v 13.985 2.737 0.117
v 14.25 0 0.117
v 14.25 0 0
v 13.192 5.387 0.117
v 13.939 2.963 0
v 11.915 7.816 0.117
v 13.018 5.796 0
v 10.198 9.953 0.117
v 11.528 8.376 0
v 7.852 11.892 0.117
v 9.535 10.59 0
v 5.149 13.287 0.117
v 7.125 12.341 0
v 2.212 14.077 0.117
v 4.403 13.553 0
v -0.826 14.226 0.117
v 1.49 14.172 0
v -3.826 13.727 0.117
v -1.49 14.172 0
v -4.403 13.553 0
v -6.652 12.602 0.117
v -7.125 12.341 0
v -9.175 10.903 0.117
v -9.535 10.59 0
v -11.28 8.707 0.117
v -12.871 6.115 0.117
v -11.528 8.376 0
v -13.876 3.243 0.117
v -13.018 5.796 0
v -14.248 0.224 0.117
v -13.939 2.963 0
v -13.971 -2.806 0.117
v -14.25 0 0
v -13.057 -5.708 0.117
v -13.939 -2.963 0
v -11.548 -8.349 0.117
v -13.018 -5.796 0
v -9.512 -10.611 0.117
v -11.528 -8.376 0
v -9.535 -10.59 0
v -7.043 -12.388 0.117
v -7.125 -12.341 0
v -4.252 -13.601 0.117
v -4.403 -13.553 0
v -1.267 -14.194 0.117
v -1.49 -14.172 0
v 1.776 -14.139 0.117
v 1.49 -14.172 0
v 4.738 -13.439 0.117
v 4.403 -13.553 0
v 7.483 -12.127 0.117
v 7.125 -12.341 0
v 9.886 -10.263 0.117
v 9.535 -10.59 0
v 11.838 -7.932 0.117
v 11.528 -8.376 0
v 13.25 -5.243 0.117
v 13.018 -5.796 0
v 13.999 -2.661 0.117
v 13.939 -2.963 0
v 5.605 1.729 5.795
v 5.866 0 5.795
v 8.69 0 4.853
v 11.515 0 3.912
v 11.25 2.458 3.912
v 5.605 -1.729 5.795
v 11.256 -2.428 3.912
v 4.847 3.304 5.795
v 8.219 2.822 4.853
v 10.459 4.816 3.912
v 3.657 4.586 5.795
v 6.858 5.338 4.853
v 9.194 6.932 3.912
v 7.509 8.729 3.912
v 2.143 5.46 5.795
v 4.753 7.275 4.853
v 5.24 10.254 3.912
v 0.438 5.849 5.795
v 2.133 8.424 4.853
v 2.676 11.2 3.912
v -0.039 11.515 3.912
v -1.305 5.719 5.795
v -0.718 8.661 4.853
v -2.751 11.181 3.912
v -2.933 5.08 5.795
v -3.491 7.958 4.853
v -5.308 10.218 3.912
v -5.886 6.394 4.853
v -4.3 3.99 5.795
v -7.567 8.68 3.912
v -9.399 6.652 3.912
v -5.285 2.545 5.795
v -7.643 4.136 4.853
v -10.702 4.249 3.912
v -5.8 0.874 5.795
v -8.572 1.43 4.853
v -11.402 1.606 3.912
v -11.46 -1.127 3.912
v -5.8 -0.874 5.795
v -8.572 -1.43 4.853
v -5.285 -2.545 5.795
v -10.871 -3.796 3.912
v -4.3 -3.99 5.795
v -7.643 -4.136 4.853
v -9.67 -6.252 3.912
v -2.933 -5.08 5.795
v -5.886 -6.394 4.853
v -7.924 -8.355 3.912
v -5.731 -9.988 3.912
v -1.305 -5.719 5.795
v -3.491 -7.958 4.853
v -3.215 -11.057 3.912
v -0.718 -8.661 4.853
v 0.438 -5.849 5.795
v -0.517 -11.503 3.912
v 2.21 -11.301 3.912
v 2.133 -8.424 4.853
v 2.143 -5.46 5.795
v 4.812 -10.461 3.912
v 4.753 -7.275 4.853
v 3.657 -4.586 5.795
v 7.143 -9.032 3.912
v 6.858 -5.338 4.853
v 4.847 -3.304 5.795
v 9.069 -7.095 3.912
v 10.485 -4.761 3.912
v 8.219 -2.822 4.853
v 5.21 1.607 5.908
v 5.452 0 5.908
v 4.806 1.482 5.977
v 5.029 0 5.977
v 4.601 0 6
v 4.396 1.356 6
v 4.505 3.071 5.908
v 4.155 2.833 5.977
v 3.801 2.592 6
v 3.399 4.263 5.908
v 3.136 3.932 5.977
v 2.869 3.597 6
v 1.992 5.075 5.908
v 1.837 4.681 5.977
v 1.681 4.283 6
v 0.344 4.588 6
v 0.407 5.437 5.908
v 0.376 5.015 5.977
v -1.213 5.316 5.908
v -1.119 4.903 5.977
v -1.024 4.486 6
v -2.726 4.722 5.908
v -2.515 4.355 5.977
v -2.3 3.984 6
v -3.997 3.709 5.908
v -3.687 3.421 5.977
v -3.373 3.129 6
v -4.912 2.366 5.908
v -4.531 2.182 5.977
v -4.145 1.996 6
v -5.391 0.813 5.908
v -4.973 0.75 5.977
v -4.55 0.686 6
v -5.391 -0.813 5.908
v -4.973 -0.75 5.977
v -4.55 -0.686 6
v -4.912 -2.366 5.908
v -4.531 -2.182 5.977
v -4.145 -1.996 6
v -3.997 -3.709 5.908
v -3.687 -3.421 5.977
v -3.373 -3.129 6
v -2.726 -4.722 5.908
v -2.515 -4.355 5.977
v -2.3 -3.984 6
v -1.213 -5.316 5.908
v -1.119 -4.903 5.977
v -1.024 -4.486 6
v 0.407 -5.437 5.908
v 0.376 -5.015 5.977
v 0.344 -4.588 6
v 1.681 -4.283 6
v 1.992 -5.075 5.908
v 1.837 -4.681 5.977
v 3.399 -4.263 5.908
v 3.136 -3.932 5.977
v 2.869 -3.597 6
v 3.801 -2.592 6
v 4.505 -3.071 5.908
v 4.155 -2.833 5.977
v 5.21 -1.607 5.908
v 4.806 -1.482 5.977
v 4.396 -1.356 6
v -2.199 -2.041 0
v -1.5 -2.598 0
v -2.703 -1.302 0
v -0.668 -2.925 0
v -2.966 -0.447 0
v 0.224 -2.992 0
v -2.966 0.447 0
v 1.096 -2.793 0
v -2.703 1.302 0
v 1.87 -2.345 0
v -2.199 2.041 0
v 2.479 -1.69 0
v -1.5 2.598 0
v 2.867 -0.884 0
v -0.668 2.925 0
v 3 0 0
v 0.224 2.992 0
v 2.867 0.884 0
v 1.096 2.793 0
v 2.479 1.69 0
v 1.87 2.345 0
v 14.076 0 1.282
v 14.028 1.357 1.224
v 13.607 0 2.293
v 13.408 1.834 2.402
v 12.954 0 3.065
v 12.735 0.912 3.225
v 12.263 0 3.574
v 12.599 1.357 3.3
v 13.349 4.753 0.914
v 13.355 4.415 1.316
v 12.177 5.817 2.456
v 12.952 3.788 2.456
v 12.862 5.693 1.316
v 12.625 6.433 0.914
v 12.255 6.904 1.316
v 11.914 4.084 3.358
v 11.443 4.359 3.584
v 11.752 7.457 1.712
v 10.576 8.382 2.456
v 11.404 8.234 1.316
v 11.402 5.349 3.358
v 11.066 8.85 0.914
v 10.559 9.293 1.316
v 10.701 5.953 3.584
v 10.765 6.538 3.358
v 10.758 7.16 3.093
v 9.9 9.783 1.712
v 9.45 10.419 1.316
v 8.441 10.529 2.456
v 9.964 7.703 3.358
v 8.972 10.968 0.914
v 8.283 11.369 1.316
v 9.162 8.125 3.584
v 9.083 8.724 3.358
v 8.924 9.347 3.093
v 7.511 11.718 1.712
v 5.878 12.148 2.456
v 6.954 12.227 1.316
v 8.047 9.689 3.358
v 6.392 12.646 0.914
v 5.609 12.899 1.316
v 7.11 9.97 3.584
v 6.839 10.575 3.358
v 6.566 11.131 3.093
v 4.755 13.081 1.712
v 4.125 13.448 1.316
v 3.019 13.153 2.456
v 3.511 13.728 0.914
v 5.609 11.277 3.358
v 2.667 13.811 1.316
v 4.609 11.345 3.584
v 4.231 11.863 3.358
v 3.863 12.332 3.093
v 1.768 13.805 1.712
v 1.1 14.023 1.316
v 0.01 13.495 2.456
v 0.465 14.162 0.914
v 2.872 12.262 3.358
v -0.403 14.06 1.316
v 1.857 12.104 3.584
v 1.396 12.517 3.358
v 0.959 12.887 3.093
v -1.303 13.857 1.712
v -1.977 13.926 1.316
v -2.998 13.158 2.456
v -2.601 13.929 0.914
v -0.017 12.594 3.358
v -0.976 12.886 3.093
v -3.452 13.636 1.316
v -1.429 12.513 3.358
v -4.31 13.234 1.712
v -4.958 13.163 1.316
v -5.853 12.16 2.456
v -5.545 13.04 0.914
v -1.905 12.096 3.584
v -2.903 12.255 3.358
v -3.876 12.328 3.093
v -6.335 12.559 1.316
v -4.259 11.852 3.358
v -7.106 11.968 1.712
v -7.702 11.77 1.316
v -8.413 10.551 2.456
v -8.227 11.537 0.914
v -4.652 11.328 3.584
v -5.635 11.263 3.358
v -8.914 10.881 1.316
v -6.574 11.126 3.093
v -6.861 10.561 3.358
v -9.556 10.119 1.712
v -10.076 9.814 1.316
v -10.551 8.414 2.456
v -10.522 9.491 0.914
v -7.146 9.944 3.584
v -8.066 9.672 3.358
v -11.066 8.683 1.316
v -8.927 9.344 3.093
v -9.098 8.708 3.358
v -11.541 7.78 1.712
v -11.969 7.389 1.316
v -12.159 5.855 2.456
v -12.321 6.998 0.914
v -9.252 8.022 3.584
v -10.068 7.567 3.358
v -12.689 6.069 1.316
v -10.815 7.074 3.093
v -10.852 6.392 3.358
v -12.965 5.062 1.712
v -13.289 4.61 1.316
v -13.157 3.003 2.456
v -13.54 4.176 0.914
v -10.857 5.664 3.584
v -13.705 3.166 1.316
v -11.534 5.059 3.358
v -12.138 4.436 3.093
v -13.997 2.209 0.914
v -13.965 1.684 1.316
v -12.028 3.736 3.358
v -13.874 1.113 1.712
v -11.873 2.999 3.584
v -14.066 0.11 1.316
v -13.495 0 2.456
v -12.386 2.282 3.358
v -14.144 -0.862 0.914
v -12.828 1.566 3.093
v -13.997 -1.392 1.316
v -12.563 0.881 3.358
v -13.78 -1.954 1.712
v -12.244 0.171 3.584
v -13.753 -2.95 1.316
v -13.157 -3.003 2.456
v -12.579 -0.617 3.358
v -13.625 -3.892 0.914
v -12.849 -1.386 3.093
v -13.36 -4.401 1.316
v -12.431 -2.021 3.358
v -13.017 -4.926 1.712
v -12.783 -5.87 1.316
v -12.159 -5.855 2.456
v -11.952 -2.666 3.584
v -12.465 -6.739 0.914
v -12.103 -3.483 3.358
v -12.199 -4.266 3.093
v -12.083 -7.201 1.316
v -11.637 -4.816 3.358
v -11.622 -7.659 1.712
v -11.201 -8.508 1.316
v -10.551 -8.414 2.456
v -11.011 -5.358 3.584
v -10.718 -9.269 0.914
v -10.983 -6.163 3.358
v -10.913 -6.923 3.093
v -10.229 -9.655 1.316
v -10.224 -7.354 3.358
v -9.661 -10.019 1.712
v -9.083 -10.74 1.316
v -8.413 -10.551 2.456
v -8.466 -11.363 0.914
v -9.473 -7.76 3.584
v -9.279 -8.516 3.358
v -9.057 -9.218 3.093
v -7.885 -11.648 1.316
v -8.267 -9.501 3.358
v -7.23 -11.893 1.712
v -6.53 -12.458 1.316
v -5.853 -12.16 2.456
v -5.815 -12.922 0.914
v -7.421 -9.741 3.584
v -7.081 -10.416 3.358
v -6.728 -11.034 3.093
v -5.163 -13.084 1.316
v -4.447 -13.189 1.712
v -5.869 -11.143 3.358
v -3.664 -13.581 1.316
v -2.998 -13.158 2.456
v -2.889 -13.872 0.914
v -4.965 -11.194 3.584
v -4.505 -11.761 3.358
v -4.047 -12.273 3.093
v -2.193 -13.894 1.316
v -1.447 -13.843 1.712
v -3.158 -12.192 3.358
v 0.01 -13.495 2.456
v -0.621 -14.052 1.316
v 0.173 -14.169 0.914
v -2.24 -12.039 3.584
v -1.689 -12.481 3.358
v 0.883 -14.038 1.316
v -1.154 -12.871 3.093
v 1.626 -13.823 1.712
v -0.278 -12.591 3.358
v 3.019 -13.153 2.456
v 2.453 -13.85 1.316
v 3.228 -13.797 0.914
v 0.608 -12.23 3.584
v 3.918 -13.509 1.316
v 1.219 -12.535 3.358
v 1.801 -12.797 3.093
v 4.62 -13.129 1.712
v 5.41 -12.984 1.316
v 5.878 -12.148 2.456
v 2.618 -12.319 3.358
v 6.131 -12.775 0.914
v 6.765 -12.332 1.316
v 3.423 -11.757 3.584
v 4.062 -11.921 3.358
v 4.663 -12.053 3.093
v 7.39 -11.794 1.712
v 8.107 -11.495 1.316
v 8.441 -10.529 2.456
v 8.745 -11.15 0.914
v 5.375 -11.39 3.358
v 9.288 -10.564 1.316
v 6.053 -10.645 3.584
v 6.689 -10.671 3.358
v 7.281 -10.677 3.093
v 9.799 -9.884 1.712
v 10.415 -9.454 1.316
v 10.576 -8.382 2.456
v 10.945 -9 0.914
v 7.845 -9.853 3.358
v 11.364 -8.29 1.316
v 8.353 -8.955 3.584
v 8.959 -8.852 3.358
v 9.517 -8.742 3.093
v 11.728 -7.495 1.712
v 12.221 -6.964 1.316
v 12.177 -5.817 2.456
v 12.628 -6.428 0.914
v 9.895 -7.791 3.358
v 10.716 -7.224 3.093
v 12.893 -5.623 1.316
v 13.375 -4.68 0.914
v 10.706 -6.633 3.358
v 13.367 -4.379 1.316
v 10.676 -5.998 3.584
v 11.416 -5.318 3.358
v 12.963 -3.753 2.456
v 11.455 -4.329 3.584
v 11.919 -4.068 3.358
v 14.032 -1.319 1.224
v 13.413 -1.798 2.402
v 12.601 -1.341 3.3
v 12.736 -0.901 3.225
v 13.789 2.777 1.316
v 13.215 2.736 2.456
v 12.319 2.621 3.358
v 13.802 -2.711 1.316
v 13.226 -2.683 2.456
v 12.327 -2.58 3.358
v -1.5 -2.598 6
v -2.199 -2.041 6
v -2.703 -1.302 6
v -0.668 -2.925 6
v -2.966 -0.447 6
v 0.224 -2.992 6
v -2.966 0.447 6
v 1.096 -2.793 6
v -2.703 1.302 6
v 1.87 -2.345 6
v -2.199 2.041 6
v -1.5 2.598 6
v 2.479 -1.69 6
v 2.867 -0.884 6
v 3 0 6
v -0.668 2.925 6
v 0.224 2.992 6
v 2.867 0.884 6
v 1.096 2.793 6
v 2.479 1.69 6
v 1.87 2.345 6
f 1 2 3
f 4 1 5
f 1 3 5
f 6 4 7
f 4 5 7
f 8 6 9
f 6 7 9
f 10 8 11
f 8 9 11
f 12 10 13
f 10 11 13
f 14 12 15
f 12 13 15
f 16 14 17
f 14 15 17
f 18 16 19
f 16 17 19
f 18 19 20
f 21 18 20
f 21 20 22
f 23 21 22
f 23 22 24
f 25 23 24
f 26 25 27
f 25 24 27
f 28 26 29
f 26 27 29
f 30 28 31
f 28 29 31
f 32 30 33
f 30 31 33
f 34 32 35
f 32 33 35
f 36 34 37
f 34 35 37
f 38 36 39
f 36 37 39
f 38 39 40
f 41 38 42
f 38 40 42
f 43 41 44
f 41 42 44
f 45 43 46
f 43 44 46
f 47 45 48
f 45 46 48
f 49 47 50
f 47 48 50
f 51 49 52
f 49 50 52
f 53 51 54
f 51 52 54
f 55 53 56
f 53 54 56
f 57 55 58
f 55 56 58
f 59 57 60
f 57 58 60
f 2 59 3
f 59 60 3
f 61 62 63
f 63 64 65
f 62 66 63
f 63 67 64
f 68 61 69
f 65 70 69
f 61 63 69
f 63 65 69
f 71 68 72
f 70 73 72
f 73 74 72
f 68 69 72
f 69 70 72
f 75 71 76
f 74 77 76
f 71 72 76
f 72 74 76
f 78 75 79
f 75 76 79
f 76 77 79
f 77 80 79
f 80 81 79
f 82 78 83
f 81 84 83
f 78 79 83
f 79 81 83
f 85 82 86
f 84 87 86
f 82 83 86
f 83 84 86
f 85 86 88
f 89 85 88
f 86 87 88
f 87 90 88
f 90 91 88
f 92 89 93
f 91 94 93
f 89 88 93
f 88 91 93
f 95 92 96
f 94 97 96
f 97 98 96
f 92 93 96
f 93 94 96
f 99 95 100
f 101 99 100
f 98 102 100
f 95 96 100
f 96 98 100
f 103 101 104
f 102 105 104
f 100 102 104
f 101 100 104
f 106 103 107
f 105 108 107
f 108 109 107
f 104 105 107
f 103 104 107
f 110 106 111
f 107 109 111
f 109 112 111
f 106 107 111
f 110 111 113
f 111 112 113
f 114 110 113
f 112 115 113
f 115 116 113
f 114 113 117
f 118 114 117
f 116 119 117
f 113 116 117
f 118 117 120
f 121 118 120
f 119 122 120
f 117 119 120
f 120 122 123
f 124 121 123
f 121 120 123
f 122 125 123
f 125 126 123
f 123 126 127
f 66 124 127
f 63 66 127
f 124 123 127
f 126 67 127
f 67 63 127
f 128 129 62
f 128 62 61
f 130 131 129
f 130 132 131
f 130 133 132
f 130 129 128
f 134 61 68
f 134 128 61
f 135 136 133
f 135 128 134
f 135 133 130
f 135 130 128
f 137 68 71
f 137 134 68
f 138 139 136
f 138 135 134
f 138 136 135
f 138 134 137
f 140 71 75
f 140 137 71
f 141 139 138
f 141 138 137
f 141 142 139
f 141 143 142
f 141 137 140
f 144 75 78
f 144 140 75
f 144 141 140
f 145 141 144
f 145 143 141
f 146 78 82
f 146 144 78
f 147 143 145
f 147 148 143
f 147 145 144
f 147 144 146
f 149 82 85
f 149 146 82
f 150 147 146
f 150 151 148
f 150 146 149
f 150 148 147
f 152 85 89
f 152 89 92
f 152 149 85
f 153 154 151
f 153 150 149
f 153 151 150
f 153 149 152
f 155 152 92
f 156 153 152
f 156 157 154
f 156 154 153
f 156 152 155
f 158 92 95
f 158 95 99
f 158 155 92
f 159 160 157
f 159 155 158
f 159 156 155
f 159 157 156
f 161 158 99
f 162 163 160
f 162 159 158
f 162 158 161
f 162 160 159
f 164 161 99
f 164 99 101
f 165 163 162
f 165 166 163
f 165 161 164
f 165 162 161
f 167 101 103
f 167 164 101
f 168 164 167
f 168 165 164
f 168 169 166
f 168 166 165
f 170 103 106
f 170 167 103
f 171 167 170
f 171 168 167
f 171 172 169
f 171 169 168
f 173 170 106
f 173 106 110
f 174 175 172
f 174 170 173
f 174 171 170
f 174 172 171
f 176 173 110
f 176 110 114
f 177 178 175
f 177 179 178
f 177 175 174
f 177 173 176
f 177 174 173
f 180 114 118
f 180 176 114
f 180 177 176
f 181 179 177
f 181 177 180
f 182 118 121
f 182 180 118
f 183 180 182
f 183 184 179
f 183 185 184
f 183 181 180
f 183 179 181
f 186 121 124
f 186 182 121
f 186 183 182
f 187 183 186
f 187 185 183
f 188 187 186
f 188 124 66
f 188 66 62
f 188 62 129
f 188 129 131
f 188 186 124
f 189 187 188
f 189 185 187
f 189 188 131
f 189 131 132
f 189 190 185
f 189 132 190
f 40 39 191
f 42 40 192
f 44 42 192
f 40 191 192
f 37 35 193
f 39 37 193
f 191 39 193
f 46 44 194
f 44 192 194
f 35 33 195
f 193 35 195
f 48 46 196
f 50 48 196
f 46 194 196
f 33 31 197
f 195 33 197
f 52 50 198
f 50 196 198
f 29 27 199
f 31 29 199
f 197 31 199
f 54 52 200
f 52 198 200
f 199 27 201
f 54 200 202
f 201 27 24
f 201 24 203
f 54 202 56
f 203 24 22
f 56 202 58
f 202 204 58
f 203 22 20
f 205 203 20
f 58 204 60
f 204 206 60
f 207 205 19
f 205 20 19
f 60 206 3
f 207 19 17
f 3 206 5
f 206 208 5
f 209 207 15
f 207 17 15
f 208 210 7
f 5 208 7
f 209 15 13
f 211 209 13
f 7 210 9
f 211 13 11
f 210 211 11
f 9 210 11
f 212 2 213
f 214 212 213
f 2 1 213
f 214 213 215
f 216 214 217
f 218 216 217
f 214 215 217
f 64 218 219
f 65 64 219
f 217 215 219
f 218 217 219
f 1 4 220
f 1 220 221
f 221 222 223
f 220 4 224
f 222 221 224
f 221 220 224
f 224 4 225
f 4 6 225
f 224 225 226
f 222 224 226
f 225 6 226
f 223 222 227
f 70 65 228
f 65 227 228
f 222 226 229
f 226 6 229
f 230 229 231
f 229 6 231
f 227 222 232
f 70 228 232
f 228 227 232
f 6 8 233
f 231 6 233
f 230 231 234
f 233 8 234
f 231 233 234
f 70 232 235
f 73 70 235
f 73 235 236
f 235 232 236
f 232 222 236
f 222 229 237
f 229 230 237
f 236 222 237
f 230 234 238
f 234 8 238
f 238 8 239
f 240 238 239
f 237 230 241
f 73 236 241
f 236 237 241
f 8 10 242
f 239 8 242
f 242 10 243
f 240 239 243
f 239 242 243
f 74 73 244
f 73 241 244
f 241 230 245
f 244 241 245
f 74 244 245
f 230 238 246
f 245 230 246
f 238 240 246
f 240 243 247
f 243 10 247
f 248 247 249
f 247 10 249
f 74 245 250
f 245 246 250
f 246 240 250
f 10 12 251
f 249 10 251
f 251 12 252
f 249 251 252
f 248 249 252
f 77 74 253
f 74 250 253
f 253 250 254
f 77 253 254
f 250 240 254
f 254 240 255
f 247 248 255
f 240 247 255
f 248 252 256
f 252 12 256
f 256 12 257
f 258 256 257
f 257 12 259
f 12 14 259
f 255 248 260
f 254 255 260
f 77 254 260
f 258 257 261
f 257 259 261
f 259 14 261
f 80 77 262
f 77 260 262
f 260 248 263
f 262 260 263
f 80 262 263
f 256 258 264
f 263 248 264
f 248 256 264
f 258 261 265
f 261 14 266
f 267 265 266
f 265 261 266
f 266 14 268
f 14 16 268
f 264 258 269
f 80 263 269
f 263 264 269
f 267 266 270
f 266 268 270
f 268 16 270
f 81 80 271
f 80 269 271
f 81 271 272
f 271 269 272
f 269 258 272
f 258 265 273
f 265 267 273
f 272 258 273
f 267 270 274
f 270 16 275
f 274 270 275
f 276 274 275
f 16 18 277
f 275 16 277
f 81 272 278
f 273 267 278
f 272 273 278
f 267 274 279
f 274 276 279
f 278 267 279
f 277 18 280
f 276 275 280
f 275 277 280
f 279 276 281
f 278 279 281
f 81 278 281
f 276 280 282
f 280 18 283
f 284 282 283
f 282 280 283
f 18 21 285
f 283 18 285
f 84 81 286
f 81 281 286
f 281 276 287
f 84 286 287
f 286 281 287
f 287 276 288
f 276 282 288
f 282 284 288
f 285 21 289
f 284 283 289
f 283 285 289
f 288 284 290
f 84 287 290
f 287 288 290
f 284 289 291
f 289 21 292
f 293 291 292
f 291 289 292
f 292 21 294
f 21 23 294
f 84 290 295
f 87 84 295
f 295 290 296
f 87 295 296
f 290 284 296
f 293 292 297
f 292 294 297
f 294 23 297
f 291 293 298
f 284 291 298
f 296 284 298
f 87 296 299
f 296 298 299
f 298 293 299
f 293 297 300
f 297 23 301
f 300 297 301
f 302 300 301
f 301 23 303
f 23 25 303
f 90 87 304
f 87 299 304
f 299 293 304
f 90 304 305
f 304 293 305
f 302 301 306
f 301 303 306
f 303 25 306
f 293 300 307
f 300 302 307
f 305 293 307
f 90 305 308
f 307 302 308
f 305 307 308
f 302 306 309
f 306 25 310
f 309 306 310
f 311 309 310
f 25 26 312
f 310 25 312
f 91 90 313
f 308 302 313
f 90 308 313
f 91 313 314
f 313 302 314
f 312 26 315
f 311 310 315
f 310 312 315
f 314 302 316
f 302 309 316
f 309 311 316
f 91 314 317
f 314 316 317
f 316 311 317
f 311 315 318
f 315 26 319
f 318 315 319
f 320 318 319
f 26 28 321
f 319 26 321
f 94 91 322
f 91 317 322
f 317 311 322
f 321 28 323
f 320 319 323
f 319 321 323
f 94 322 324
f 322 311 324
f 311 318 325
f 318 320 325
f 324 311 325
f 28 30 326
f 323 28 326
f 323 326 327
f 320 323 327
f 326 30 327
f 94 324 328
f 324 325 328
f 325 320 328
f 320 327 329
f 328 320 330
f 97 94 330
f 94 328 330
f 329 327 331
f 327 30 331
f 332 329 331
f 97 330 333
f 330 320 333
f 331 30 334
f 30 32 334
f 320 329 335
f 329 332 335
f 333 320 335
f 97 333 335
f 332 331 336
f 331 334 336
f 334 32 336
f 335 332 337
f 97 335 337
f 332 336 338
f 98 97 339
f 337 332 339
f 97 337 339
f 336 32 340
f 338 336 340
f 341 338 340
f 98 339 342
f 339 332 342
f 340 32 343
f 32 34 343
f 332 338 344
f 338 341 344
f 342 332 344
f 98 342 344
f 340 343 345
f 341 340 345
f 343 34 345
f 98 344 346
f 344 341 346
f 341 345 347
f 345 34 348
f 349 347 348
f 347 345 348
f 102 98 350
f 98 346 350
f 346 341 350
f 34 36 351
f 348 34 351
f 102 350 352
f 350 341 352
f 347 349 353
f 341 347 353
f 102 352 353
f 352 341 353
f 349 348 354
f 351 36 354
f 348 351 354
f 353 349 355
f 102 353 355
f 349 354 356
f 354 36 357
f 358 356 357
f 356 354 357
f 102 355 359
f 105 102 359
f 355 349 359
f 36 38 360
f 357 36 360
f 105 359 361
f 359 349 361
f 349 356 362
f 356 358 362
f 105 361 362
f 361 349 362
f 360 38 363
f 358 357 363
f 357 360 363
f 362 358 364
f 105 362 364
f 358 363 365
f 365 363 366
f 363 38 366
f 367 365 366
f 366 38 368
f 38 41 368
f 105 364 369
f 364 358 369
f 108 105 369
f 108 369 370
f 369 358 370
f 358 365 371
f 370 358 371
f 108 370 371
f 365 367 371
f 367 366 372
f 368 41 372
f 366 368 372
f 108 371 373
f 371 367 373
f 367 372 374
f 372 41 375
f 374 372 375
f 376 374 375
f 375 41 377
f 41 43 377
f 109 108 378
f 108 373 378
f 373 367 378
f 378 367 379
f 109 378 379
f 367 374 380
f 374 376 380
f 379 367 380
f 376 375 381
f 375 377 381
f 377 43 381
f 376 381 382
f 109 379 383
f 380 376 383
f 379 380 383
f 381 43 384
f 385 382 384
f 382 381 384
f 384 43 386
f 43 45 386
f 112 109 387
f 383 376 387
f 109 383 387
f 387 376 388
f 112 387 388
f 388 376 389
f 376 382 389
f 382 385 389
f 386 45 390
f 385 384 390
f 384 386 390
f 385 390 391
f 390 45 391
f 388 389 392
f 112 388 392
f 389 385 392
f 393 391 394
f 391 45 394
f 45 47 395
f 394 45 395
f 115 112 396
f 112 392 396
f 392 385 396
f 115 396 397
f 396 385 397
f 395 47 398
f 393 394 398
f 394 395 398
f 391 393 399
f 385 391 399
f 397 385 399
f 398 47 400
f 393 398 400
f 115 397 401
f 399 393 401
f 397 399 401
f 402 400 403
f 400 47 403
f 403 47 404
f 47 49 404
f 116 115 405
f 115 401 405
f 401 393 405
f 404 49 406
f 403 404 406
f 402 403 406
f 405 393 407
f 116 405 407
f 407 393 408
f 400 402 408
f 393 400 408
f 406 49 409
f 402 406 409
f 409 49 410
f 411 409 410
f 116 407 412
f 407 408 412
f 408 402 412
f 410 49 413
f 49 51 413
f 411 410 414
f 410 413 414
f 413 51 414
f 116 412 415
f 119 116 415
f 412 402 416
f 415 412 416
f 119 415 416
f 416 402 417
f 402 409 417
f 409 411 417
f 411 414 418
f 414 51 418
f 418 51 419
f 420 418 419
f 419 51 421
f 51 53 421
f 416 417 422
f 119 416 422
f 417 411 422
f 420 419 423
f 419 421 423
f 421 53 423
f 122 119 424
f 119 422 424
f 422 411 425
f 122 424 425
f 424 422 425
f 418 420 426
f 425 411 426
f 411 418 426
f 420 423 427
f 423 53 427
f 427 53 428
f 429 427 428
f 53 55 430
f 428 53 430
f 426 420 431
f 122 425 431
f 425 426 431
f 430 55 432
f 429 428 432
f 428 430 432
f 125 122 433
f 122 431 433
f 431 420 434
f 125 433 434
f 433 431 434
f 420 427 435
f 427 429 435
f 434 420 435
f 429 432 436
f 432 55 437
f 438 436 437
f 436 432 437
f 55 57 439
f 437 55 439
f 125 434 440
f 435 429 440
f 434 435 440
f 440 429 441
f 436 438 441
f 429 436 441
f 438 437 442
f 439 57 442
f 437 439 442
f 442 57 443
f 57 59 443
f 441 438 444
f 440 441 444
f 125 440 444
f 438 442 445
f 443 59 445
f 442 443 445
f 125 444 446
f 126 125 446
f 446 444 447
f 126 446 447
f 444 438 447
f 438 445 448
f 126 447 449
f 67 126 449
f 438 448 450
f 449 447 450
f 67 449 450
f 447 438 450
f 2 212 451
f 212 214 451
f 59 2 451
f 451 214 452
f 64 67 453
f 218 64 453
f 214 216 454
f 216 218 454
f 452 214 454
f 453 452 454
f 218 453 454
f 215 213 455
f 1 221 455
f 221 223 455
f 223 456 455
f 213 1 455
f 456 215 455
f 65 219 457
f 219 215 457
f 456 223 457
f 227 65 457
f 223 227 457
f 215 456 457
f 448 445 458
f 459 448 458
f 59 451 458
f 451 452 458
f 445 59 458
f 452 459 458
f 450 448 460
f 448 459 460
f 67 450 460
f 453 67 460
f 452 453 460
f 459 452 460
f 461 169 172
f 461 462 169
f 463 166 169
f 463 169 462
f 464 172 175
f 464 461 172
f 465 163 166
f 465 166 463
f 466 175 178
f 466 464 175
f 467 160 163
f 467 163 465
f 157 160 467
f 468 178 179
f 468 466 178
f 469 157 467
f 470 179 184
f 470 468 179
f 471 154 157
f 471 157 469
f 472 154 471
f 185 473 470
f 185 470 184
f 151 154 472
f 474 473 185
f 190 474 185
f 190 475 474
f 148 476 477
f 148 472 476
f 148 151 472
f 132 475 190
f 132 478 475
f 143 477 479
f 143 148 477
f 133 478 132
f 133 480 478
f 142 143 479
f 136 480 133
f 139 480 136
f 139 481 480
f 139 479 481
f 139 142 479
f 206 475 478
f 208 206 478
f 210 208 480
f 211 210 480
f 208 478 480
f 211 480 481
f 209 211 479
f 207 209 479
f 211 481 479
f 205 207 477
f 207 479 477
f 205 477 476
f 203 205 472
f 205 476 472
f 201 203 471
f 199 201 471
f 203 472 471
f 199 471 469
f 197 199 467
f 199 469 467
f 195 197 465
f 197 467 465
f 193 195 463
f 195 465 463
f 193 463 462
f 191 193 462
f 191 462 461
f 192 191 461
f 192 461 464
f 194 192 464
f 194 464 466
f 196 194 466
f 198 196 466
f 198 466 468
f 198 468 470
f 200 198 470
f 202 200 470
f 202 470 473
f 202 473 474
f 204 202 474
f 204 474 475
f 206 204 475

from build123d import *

# Parameters (mm, degrees)
F0_R     = 14.25
F1_DEPTH = 6
F2_R     = 3
F3_DEPTH = 25
F4_SIZE2 = 3
F4_SIZE  = 9
F5_R     = 4


with BuildPart() as f1:
    # F0 (on Top) → F1 (new body)
    with BuildSketch(Plane.XY):
        Circle(F0_R)
    extrude(amount=F1_DEPTH)

    # F2 (on face) → F3 (cut)
    with BuildSketch(Plane.XY.offset(6)):
        Circle(F2_R)
    extrude(amount=-F3_DEPTH, mode=Mode.SUBTRACT)

    # F4
    f4_edges = [f1.edges().sort_by_distance(p)[0] for p in [
        (-14.25, 0, 6),
    ]]
    f4_side = f1.faces().sort_by_distance((-13.846949, 0, 6))[0]
    chamfer(f4_edges, length=F4_SIZE, length2=F4_SIZE2, reference=f4_side)

    # F5
    f5_edges = [f1.edges().sort_by_distance(p)[0] for p in [
        (-5.25, 0, 6),
        (-14.25, 0, 3),
    ]]
    fillet(f5_edges, radius=F5_R)


solid = f1.part
